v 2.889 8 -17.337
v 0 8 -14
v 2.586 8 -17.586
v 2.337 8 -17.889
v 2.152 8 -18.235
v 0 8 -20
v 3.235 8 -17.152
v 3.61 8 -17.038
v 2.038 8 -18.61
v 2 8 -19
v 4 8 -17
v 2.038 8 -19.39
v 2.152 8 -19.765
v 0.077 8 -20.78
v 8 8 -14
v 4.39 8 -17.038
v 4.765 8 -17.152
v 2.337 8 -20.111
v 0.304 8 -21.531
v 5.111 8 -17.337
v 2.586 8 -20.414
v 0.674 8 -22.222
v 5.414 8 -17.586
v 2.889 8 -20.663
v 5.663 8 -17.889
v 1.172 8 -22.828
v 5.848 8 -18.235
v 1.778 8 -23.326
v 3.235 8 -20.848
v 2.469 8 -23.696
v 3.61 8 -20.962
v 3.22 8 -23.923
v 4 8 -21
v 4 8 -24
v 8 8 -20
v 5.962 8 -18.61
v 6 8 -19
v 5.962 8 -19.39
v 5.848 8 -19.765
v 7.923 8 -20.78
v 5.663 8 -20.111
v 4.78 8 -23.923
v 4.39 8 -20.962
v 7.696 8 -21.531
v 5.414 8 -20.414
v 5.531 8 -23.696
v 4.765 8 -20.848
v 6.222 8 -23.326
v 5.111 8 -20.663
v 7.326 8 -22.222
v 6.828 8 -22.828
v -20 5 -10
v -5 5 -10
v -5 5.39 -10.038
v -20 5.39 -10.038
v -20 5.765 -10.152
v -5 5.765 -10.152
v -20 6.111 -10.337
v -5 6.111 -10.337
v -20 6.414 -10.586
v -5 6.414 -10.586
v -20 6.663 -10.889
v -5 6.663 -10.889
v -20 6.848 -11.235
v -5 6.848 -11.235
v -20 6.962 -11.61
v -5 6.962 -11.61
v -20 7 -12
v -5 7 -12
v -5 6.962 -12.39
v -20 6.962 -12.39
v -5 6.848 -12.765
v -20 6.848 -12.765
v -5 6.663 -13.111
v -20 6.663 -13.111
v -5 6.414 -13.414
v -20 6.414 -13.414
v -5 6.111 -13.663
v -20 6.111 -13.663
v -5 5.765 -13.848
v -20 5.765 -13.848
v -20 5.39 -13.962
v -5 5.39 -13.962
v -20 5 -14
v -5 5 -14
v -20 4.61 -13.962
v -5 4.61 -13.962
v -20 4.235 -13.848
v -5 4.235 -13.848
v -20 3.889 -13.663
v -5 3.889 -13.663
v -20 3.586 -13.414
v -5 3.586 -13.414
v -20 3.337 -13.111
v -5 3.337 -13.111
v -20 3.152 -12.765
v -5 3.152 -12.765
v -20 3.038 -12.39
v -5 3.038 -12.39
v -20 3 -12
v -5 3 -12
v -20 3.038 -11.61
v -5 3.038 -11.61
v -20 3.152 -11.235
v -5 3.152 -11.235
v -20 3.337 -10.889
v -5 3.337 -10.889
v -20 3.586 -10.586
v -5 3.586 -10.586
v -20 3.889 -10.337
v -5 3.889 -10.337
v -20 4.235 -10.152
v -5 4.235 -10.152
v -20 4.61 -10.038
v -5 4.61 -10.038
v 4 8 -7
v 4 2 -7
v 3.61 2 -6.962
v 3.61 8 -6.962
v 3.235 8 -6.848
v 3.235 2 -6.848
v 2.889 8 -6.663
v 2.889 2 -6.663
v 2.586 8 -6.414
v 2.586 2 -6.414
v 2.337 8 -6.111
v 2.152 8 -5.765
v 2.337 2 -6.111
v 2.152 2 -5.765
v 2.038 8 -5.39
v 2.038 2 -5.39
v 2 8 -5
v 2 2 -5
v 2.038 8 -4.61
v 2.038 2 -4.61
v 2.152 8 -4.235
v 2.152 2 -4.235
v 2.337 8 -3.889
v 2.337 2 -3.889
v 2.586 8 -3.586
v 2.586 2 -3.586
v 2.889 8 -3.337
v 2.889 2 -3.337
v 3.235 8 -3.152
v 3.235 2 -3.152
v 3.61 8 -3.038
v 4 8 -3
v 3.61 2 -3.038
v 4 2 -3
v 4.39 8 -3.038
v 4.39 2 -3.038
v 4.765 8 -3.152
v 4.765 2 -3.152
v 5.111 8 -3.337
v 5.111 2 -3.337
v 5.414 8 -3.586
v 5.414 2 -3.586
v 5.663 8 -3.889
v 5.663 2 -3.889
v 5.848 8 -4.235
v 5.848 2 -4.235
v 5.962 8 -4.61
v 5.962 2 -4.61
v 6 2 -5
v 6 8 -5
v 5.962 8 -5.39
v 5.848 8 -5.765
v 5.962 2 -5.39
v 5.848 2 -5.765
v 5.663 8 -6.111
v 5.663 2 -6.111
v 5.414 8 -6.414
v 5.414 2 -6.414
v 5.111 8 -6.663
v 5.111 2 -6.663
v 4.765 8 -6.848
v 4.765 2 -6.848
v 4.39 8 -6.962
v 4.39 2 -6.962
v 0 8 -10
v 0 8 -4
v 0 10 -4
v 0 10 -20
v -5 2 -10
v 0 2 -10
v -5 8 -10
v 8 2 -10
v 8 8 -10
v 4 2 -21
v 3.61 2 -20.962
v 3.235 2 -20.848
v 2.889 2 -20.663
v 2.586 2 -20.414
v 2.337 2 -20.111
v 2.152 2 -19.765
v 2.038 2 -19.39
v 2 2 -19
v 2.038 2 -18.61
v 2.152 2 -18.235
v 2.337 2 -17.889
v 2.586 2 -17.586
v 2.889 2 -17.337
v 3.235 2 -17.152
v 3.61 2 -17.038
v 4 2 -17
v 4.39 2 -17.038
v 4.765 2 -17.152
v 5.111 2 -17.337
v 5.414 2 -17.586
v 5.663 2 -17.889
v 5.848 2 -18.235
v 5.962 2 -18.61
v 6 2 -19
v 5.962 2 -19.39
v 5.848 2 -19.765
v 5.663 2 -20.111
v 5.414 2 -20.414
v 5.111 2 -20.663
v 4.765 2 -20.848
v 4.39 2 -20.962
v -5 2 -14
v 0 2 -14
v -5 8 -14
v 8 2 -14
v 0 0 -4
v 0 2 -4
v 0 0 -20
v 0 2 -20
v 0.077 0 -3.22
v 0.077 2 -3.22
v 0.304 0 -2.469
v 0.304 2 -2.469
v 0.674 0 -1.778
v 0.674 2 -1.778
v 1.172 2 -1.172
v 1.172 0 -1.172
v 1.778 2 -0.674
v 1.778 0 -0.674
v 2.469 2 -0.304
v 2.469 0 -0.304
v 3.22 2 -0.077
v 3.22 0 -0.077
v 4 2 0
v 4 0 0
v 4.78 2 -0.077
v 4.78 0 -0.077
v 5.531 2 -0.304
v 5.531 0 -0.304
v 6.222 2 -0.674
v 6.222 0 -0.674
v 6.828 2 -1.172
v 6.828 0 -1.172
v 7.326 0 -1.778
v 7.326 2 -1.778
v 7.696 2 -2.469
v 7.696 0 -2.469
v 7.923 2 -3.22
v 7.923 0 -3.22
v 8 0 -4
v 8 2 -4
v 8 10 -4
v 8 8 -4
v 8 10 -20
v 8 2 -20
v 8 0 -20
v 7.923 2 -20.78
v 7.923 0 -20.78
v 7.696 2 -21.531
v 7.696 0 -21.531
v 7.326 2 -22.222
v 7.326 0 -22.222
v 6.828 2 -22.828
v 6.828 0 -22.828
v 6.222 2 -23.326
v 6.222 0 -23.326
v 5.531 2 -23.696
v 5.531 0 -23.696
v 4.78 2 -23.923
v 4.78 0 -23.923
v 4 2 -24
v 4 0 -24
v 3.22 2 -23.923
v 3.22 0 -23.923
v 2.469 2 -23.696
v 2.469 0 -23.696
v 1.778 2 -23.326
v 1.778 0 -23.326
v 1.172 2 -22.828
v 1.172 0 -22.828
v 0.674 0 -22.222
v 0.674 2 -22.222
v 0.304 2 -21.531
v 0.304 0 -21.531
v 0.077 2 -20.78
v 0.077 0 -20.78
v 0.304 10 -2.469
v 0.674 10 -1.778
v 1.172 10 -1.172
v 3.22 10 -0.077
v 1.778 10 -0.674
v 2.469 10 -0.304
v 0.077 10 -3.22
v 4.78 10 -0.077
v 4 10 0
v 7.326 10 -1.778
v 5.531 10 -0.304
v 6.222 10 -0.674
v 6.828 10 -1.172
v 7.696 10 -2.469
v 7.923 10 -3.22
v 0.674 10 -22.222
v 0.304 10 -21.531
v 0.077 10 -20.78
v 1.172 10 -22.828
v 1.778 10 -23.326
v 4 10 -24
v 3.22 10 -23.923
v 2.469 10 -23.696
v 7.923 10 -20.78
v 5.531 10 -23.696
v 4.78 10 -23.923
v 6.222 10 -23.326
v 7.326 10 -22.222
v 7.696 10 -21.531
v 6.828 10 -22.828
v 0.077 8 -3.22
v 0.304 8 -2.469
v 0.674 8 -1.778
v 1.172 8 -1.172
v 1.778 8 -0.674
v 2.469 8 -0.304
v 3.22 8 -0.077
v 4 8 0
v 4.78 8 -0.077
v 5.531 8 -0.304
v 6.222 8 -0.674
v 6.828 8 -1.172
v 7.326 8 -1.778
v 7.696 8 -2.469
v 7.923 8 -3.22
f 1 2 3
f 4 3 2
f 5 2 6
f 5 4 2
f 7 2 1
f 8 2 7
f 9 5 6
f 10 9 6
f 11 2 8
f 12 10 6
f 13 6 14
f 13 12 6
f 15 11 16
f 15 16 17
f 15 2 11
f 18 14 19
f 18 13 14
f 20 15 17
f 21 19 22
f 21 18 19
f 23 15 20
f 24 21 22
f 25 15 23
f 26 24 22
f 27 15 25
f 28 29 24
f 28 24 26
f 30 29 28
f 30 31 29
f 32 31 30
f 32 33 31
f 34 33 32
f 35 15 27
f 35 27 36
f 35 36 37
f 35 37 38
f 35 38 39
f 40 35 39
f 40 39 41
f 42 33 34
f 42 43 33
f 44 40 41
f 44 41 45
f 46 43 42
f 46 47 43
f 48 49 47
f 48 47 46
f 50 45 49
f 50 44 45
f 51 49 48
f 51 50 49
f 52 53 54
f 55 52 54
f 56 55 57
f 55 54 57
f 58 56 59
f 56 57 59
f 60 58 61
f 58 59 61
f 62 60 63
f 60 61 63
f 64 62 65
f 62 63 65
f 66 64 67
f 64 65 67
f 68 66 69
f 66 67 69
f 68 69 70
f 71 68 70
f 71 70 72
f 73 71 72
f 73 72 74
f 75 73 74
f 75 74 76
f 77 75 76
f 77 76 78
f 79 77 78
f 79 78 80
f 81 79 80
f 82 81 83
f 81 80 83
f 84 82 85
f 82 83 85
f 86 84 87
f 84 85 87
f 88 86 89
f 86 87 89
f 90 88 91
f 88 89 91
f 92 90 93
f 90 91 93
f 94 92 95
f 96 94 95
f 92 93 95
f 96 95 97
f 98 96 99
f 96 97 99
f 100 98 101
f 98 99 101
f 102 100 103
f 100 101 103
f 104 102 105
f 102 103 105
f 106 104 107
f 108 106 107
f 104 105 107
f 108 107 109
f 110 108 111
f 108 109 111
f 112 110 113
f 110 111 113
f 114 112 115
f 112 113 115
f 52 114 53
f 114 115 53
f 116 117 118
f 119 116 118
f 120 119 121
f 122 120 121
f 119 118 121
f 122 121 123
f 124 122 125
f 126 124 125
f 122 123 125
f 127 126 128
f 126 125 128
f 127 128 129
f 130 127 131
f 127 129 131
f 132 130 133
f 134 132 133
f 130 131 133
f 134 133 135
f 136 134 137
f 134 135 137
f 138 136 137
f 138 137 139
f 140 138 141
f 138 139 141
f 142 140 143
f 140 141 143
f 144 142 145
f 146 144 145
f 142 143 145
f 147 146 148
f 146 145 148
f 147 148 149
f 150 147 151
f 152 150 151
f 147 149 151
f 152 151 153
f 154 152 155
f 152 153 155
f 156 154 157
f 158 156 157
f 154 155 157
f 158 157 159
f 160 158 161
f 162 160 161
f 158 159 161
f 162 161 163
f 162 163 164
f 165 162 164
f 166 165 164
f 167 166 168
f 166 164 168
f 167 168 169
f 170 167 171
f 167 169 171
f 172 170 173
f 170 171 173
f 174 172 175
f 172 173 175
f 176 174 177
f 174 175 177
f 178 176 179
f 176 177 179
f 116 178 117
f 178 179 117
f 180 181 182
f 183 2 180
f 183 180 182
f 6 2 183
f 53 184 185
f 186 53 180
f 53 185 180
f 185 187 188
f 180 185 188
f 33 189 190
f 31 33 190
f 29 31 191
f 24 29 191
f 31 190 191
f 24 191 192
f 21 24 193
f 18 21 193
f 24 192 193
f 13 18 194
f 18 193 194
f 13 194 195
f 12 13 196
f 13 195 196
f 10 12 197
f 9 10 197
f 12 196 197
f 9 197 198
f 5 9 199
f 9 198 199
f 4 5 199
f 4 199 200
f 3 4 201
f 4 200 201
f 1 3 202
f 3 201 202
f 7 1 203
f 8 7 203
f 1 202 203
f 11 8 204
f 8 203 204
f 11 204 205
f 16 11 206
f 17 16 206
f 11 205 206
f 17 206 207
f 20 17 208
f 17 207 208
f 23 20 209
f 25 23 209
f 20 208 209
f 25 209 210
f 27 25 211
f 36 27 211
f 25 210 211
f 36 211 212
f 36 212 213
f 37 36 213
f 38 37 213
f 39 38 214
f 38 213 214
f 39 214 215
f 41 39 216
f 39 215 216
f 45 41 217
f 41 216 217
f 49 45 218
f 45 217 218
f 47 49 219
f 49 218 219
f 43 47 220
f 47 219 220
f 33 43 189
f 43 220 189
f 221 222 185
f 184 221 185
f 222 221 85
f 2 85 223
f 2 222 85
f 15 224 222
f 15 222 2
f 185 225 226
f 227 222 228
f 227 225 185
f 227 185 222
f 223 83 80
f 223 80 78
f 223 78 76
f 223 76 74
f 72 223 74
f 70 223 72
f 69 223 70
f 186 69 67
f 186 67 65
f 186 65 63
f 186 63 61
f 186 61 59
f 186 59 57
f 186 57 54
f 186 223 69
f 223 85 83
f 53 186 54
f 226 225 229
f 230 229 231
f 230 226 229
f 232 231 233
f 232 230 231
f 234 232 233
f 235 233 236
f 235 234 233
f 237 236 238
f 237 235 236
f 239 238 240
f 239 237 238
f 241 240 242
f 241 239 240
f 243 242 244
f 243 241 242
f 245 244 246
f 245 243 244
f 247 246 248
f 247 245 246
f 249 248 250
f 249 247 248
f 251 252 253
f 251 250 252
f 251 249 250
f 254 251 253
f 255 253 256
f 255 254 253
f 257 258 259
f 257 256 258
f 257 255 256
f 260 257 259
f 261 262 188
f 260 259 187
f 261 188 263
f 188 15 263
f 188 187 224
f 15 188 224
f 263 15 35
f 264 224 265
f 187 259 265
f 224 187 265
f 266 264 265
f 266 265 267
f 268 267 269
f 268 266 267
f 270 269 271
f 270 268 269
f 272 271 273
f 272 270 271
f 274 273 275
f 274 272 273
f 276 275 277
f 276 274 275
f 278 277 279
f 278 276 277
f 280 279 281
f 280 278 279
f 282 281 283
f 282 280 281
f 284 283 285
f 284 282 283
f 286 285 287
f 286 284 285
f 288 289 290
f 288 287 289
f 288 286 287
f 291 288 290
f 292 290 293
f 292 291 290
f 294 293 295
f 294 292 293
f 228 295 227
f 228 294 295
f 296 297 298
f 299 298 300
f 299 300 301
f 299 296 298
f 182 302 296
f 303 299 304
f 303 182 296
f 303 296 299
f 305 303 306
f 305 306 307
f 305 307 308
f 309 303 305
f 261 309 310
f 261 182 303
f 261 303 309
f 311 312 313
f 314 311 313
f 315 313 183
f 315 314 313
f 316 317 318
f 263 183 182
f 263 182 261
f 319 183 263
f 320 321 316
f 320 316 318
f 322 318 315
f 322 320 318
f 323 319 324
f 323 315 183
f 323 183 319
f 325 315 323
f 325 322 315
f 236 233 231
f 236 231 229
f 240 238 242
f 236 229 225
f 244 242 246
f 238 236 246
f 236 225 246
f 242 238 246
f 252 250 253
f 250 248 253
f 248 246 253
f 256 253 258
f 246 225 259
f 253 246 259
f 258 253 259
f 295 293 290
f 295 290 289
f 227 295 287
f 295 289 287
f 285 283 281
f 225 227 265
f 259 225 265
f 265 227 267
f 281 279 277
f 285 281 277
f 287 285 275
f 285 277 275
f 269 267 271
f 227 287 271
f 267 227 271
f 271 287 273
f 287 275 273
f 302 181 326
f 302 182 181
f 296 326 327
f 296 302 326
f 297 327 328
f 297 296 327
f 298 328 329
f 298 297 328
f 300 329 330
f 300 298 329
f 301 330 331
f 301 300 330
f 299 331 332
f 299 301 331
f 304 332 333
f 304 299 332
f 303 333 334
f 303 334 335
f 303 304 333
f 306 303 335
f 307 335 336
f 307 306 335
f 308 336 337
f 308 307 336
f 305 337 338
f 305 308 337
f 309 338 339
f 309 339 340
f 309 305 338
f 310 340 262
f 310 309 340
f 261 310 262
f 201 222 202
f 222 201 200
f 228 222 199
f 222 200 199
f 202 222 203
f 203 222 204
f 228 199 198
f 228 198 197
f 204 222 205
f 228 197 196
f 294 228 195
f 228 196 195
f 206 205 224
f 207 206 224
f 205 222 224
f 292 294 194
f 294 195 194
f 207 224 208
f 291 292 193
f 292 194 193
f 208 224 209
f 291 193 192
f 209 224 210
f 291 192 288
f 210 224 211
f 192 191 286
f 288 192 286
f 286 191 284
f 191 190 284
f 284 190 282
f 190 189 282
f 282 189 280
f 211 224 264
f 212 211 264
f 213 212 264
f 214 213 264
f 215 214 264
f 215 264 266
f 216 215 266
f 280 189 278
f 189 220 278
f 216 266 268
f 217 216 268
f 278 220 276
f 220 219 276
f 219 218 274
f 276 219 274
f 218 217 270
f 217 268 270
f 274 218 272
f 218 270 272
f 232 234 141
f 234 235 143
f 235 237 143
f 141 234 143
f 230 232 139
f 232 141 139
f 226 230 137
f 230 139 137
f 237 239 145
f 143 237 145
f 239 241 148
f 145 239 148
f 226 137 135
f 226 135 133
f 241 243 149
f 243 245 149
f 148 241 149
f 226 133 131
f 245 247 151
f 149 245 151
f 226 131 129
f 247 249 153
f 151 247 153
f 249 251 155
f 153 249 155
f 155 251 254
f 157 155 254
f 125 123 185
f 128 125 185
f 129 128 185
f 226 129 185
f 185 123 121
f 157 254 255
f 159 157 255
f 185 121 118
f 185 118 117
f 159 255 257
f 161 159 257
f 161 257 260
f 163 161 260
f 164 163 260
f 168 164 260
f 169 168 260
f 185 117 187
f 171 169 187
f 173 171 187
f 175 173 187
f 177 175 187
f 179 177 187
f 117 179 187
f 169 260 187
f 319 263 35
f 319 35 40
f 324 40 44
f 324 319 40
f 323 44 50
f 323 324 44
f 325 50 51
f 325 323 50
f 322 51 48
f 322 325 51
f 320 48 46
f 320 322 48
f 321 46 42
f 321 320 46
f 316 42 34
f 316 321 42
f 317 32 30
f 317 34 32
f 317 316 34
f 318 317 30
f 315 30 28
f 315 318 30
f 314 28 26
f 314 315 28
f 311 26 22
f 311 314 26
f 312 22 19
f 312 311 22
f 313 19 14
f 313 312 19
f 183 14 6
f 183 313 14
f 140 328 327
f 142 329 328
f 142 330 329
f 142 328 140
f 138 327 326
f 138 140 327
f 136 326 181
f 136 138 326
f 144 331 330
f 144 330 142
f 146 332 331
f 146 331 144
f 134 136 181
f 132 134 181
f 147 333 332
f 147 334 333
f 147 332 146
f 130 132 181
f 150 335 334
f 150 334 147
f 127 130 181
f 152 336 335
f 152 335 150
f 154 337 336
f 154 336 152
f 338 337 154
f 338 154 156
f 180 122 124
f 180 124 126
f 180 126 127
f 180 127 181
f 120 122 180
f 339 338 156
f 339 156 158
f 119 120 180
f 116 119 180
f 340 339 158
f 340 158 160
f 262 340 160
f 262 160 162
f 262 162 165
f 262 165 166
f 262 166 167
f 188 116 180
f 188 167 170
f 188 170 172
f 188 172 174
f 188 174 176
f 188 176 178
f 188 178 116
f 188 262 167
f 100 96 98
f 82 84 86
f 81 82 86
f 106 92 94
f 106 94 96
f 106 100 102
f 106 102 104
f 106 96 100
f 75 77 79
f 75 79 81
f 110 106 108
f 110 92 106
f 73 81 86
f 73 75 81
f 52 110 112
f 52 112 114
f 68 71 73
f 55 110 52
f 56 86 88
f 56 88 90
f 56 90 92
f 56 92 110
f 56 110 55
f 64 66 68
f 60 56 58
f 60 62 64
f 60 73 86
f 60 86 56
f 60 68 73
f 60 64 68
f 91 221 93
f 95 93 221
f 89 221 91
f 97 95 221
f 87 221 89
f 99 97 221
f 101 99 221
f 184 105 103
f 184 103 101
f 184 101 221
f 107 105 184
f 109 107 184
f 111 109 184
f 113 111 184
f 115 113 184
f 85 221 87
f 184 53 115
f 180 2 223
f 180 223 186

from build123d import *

# Parameters (mm, degrees)
ESQUISSE1_W             = 8
ESQUISSE1_H             = 24
BOSS_EXTRU_1_DEPTH      = 10
ESQUISSE2_W             = 10
ESQUISSE2_H             = 6
ENL_V_MAT_EXTRU_1_DEPTH = 10
ESQUISSE3_R             = 2
BOSS_EXTRU_2_DEPTH      = 6
CONG_1_RADIUS           = 4
CONG_1_LENGTH           = 2
CONG_2_RADIUS           = 4
CONG_2_LENGTH           = 2
CONG_3_RADIUS           = 4
CONG_3_LENGTH           = 2
CONG_4_RADIUS           = 4
CONG_4_LENGTH           = 2
ESQUISSE4_R             = 2
BOSS_EXTRU_3_DEPTH      = 20
ESQUISSE5_W             = 4
ESQUISSE5_H             = 6
BOSS_EXTRU_4_DEPTH      = 5


with BuildPart() as part:
    # Esquisse1 → Boss.-Extru.1 (new body)
    with BuildSketch(Plane(origin=(0, 0, 0), x_dir=(1, 0, 0), z_dir=(0, 1, 0))):
        with Locations((4, 12)):
            Rectangle(ESQUISSE1_W, ESQUISSE1_H)
    extrude(amount=BOSS_EXTRU_1_DEPTH)

    # Esquisse2 → Enlèv. mat.-Extru.1 (cut)
    with BuildSketch(Plane(origin=(8, 0, 0), x_dir=(0, 0, -1), z_dir=(1, 0, 0))):
        with Locations((5, 5)):
            Rectangle(ESQUISSE2_W, ESQUISSE2_H)
        with Locations((19, 5)):
            Rectangle(ESQUISSE2_W, ESQUISSE2_H)
    extrude(amount=-ENL_V_MAT_EXTRU_1_DEPTH, mode=Mode.SUBTRACT)

    # Esquisse3 → Boss.-Extru.2 (add)
    with BuildSketch(Plane(origin=(0, 2, 0), x_dir=(1, 0, 0), z_dir=(0, 1, 0))):
        with Locations(Location((4, 5, 0), (0, 0, 90))):
            Circle(ESQUISSE3_R)
        with Locations(Location((4, 19, 0), (0, 0, 90))):
            Circle(ESQUISSE3_R)
    extrude(amount=BOSS_EXTRU_2_DEPTH)

    # Congé1: full round fillet: the end face becomes a half cylinder, R = half its width
    cong_1_face = Plane((4, 1, -24), x_dir=(0, 1, 0), z_dir=(0, 0, -1))  # on the end face: x along it, z out of the body
    cong_1_slab = cong_1_face.offset(-CONG_1_RADIUS / 2) * Box(CONG_1_LENGTH, 2 * CONG_1_RADIUS, CONG_1_RADIUS, mode=Mode.PRIVATE)  # the body's end, R deep
    cong_1_round = Plane((4, 1, -20), x_dir=(0, 0, -1), z_dir=(0, 1, 0)) * Cylinder(CONG_1_RADIUS, CONG_1_LENGTH, mode=Mode.PRIVATE)  # its axis R under the face
    add(cong_1_slab - cong_1_round, mode=Mode.SUBTRACT)

    # Congé2: full round fillet: the end face becomes a half cylinder, R = half its width
    cong_2_face = Plane((4, 9, -24), x_dir=(0, 1, 0), z_dir=(0, 0, -1))  # on the end face: x along it, z out of the body
    cong_2_slab = cong_2_face.offset(-CONG_2_RADIUS / 2) * Box(CONG_2_LENGTH, 2 * CONG_2_RADIUS, CONG_2_RADIUS, mode=Mode.PRIVATE)  # the body's end, R deep
    cong_2_round = Plane((4, 9, -20), x_dir=(0, 0, -1), z_dir=(0, 1, 0)) * Cylinder(CONG_2_RADIUS, CONG_2_LENGTH, mode=Mode.PRIVATE)  # its axis R under the face
    add(cong_2_slab - cong_2_round, mode=Mode.SUBTRACT)

    # Congé3: full round fillet: the end face becomes a half cylinder, R = half its width
    cong_3_face = Plane((4, 9, 0), x_dir=(0, 1, 0), z_dir=(0, 0, 1))  # on the end face: x along it, z out of the body
    cong_3_slab = cong_3_face.offset(-CONG_3_RADIUS / 2) * Box(CONG_3_LENGTH, 2 * CONG_3_RADIUS, CONG_3_RADIUS, mode=Mode.PRIVATE)  # the body's end, R deep
    cong_3_round = Plane((4, 9, -4), x_dir=(0, 0, 1), z_dir=(0, 1, 0)) * Cylinder(CONG_3_RADIUS, CONG_3_LENGTH, mode=Mode.PRIVATE)  # its axis R under the face
    add(cong_3_slab - cong_3_round, mode=Mode.SUBTRACT)

    # Congé4: full round fillet: the end face becomes a half cylinder, R = half its width
    cong_4_face = Plane((4, 1, 0), x_dir=(0, 1, 0), z_dir=(0, 0, 1))  # on the end face: x along it, z out of the body
    cong_4_slab = cong_4_face.offset(-CONG_4_RADIUS / 2) * Box(CONG_4_LENGTH, 2 * CONG_4_RADIUS, CONG_4_RADIUS, mode=Mode.PRIVATE)  # the body's end, R deep
    cong_4_round = Plane((4, 1, -4), x_dir=(0, 0, 1), z_dir=(0, 1, 0)) * Cylinder(CONG_4_RADIUS, CONG_4_LENGTH, mode=Mode.PRIVATE)  # its axis R under the face
    add(cong_4_slab - cong_4_round, mode=Mode.SUBTRACT)

    # Esquisse4 → Boss.-Extru.3 (add)
    with BuildSketch(Plane.ZY):
        with Locations((-12, 5)):
            Circle(ESQUISSE4_R)
    extrude(amount=BOSS_EXTRU_3_DEPTH)

    # Esquisse5 → Boss.-Extru.4 (add)
    with BuildSketch(Plane.ZY):
        with Locations((-12, 5)):
            Rectangle(ESQUISSE5_W, ESQUISSE5_H)
    extrude(amount=BOSS_EXTRU_4_DEPTH)


solid = part.part
